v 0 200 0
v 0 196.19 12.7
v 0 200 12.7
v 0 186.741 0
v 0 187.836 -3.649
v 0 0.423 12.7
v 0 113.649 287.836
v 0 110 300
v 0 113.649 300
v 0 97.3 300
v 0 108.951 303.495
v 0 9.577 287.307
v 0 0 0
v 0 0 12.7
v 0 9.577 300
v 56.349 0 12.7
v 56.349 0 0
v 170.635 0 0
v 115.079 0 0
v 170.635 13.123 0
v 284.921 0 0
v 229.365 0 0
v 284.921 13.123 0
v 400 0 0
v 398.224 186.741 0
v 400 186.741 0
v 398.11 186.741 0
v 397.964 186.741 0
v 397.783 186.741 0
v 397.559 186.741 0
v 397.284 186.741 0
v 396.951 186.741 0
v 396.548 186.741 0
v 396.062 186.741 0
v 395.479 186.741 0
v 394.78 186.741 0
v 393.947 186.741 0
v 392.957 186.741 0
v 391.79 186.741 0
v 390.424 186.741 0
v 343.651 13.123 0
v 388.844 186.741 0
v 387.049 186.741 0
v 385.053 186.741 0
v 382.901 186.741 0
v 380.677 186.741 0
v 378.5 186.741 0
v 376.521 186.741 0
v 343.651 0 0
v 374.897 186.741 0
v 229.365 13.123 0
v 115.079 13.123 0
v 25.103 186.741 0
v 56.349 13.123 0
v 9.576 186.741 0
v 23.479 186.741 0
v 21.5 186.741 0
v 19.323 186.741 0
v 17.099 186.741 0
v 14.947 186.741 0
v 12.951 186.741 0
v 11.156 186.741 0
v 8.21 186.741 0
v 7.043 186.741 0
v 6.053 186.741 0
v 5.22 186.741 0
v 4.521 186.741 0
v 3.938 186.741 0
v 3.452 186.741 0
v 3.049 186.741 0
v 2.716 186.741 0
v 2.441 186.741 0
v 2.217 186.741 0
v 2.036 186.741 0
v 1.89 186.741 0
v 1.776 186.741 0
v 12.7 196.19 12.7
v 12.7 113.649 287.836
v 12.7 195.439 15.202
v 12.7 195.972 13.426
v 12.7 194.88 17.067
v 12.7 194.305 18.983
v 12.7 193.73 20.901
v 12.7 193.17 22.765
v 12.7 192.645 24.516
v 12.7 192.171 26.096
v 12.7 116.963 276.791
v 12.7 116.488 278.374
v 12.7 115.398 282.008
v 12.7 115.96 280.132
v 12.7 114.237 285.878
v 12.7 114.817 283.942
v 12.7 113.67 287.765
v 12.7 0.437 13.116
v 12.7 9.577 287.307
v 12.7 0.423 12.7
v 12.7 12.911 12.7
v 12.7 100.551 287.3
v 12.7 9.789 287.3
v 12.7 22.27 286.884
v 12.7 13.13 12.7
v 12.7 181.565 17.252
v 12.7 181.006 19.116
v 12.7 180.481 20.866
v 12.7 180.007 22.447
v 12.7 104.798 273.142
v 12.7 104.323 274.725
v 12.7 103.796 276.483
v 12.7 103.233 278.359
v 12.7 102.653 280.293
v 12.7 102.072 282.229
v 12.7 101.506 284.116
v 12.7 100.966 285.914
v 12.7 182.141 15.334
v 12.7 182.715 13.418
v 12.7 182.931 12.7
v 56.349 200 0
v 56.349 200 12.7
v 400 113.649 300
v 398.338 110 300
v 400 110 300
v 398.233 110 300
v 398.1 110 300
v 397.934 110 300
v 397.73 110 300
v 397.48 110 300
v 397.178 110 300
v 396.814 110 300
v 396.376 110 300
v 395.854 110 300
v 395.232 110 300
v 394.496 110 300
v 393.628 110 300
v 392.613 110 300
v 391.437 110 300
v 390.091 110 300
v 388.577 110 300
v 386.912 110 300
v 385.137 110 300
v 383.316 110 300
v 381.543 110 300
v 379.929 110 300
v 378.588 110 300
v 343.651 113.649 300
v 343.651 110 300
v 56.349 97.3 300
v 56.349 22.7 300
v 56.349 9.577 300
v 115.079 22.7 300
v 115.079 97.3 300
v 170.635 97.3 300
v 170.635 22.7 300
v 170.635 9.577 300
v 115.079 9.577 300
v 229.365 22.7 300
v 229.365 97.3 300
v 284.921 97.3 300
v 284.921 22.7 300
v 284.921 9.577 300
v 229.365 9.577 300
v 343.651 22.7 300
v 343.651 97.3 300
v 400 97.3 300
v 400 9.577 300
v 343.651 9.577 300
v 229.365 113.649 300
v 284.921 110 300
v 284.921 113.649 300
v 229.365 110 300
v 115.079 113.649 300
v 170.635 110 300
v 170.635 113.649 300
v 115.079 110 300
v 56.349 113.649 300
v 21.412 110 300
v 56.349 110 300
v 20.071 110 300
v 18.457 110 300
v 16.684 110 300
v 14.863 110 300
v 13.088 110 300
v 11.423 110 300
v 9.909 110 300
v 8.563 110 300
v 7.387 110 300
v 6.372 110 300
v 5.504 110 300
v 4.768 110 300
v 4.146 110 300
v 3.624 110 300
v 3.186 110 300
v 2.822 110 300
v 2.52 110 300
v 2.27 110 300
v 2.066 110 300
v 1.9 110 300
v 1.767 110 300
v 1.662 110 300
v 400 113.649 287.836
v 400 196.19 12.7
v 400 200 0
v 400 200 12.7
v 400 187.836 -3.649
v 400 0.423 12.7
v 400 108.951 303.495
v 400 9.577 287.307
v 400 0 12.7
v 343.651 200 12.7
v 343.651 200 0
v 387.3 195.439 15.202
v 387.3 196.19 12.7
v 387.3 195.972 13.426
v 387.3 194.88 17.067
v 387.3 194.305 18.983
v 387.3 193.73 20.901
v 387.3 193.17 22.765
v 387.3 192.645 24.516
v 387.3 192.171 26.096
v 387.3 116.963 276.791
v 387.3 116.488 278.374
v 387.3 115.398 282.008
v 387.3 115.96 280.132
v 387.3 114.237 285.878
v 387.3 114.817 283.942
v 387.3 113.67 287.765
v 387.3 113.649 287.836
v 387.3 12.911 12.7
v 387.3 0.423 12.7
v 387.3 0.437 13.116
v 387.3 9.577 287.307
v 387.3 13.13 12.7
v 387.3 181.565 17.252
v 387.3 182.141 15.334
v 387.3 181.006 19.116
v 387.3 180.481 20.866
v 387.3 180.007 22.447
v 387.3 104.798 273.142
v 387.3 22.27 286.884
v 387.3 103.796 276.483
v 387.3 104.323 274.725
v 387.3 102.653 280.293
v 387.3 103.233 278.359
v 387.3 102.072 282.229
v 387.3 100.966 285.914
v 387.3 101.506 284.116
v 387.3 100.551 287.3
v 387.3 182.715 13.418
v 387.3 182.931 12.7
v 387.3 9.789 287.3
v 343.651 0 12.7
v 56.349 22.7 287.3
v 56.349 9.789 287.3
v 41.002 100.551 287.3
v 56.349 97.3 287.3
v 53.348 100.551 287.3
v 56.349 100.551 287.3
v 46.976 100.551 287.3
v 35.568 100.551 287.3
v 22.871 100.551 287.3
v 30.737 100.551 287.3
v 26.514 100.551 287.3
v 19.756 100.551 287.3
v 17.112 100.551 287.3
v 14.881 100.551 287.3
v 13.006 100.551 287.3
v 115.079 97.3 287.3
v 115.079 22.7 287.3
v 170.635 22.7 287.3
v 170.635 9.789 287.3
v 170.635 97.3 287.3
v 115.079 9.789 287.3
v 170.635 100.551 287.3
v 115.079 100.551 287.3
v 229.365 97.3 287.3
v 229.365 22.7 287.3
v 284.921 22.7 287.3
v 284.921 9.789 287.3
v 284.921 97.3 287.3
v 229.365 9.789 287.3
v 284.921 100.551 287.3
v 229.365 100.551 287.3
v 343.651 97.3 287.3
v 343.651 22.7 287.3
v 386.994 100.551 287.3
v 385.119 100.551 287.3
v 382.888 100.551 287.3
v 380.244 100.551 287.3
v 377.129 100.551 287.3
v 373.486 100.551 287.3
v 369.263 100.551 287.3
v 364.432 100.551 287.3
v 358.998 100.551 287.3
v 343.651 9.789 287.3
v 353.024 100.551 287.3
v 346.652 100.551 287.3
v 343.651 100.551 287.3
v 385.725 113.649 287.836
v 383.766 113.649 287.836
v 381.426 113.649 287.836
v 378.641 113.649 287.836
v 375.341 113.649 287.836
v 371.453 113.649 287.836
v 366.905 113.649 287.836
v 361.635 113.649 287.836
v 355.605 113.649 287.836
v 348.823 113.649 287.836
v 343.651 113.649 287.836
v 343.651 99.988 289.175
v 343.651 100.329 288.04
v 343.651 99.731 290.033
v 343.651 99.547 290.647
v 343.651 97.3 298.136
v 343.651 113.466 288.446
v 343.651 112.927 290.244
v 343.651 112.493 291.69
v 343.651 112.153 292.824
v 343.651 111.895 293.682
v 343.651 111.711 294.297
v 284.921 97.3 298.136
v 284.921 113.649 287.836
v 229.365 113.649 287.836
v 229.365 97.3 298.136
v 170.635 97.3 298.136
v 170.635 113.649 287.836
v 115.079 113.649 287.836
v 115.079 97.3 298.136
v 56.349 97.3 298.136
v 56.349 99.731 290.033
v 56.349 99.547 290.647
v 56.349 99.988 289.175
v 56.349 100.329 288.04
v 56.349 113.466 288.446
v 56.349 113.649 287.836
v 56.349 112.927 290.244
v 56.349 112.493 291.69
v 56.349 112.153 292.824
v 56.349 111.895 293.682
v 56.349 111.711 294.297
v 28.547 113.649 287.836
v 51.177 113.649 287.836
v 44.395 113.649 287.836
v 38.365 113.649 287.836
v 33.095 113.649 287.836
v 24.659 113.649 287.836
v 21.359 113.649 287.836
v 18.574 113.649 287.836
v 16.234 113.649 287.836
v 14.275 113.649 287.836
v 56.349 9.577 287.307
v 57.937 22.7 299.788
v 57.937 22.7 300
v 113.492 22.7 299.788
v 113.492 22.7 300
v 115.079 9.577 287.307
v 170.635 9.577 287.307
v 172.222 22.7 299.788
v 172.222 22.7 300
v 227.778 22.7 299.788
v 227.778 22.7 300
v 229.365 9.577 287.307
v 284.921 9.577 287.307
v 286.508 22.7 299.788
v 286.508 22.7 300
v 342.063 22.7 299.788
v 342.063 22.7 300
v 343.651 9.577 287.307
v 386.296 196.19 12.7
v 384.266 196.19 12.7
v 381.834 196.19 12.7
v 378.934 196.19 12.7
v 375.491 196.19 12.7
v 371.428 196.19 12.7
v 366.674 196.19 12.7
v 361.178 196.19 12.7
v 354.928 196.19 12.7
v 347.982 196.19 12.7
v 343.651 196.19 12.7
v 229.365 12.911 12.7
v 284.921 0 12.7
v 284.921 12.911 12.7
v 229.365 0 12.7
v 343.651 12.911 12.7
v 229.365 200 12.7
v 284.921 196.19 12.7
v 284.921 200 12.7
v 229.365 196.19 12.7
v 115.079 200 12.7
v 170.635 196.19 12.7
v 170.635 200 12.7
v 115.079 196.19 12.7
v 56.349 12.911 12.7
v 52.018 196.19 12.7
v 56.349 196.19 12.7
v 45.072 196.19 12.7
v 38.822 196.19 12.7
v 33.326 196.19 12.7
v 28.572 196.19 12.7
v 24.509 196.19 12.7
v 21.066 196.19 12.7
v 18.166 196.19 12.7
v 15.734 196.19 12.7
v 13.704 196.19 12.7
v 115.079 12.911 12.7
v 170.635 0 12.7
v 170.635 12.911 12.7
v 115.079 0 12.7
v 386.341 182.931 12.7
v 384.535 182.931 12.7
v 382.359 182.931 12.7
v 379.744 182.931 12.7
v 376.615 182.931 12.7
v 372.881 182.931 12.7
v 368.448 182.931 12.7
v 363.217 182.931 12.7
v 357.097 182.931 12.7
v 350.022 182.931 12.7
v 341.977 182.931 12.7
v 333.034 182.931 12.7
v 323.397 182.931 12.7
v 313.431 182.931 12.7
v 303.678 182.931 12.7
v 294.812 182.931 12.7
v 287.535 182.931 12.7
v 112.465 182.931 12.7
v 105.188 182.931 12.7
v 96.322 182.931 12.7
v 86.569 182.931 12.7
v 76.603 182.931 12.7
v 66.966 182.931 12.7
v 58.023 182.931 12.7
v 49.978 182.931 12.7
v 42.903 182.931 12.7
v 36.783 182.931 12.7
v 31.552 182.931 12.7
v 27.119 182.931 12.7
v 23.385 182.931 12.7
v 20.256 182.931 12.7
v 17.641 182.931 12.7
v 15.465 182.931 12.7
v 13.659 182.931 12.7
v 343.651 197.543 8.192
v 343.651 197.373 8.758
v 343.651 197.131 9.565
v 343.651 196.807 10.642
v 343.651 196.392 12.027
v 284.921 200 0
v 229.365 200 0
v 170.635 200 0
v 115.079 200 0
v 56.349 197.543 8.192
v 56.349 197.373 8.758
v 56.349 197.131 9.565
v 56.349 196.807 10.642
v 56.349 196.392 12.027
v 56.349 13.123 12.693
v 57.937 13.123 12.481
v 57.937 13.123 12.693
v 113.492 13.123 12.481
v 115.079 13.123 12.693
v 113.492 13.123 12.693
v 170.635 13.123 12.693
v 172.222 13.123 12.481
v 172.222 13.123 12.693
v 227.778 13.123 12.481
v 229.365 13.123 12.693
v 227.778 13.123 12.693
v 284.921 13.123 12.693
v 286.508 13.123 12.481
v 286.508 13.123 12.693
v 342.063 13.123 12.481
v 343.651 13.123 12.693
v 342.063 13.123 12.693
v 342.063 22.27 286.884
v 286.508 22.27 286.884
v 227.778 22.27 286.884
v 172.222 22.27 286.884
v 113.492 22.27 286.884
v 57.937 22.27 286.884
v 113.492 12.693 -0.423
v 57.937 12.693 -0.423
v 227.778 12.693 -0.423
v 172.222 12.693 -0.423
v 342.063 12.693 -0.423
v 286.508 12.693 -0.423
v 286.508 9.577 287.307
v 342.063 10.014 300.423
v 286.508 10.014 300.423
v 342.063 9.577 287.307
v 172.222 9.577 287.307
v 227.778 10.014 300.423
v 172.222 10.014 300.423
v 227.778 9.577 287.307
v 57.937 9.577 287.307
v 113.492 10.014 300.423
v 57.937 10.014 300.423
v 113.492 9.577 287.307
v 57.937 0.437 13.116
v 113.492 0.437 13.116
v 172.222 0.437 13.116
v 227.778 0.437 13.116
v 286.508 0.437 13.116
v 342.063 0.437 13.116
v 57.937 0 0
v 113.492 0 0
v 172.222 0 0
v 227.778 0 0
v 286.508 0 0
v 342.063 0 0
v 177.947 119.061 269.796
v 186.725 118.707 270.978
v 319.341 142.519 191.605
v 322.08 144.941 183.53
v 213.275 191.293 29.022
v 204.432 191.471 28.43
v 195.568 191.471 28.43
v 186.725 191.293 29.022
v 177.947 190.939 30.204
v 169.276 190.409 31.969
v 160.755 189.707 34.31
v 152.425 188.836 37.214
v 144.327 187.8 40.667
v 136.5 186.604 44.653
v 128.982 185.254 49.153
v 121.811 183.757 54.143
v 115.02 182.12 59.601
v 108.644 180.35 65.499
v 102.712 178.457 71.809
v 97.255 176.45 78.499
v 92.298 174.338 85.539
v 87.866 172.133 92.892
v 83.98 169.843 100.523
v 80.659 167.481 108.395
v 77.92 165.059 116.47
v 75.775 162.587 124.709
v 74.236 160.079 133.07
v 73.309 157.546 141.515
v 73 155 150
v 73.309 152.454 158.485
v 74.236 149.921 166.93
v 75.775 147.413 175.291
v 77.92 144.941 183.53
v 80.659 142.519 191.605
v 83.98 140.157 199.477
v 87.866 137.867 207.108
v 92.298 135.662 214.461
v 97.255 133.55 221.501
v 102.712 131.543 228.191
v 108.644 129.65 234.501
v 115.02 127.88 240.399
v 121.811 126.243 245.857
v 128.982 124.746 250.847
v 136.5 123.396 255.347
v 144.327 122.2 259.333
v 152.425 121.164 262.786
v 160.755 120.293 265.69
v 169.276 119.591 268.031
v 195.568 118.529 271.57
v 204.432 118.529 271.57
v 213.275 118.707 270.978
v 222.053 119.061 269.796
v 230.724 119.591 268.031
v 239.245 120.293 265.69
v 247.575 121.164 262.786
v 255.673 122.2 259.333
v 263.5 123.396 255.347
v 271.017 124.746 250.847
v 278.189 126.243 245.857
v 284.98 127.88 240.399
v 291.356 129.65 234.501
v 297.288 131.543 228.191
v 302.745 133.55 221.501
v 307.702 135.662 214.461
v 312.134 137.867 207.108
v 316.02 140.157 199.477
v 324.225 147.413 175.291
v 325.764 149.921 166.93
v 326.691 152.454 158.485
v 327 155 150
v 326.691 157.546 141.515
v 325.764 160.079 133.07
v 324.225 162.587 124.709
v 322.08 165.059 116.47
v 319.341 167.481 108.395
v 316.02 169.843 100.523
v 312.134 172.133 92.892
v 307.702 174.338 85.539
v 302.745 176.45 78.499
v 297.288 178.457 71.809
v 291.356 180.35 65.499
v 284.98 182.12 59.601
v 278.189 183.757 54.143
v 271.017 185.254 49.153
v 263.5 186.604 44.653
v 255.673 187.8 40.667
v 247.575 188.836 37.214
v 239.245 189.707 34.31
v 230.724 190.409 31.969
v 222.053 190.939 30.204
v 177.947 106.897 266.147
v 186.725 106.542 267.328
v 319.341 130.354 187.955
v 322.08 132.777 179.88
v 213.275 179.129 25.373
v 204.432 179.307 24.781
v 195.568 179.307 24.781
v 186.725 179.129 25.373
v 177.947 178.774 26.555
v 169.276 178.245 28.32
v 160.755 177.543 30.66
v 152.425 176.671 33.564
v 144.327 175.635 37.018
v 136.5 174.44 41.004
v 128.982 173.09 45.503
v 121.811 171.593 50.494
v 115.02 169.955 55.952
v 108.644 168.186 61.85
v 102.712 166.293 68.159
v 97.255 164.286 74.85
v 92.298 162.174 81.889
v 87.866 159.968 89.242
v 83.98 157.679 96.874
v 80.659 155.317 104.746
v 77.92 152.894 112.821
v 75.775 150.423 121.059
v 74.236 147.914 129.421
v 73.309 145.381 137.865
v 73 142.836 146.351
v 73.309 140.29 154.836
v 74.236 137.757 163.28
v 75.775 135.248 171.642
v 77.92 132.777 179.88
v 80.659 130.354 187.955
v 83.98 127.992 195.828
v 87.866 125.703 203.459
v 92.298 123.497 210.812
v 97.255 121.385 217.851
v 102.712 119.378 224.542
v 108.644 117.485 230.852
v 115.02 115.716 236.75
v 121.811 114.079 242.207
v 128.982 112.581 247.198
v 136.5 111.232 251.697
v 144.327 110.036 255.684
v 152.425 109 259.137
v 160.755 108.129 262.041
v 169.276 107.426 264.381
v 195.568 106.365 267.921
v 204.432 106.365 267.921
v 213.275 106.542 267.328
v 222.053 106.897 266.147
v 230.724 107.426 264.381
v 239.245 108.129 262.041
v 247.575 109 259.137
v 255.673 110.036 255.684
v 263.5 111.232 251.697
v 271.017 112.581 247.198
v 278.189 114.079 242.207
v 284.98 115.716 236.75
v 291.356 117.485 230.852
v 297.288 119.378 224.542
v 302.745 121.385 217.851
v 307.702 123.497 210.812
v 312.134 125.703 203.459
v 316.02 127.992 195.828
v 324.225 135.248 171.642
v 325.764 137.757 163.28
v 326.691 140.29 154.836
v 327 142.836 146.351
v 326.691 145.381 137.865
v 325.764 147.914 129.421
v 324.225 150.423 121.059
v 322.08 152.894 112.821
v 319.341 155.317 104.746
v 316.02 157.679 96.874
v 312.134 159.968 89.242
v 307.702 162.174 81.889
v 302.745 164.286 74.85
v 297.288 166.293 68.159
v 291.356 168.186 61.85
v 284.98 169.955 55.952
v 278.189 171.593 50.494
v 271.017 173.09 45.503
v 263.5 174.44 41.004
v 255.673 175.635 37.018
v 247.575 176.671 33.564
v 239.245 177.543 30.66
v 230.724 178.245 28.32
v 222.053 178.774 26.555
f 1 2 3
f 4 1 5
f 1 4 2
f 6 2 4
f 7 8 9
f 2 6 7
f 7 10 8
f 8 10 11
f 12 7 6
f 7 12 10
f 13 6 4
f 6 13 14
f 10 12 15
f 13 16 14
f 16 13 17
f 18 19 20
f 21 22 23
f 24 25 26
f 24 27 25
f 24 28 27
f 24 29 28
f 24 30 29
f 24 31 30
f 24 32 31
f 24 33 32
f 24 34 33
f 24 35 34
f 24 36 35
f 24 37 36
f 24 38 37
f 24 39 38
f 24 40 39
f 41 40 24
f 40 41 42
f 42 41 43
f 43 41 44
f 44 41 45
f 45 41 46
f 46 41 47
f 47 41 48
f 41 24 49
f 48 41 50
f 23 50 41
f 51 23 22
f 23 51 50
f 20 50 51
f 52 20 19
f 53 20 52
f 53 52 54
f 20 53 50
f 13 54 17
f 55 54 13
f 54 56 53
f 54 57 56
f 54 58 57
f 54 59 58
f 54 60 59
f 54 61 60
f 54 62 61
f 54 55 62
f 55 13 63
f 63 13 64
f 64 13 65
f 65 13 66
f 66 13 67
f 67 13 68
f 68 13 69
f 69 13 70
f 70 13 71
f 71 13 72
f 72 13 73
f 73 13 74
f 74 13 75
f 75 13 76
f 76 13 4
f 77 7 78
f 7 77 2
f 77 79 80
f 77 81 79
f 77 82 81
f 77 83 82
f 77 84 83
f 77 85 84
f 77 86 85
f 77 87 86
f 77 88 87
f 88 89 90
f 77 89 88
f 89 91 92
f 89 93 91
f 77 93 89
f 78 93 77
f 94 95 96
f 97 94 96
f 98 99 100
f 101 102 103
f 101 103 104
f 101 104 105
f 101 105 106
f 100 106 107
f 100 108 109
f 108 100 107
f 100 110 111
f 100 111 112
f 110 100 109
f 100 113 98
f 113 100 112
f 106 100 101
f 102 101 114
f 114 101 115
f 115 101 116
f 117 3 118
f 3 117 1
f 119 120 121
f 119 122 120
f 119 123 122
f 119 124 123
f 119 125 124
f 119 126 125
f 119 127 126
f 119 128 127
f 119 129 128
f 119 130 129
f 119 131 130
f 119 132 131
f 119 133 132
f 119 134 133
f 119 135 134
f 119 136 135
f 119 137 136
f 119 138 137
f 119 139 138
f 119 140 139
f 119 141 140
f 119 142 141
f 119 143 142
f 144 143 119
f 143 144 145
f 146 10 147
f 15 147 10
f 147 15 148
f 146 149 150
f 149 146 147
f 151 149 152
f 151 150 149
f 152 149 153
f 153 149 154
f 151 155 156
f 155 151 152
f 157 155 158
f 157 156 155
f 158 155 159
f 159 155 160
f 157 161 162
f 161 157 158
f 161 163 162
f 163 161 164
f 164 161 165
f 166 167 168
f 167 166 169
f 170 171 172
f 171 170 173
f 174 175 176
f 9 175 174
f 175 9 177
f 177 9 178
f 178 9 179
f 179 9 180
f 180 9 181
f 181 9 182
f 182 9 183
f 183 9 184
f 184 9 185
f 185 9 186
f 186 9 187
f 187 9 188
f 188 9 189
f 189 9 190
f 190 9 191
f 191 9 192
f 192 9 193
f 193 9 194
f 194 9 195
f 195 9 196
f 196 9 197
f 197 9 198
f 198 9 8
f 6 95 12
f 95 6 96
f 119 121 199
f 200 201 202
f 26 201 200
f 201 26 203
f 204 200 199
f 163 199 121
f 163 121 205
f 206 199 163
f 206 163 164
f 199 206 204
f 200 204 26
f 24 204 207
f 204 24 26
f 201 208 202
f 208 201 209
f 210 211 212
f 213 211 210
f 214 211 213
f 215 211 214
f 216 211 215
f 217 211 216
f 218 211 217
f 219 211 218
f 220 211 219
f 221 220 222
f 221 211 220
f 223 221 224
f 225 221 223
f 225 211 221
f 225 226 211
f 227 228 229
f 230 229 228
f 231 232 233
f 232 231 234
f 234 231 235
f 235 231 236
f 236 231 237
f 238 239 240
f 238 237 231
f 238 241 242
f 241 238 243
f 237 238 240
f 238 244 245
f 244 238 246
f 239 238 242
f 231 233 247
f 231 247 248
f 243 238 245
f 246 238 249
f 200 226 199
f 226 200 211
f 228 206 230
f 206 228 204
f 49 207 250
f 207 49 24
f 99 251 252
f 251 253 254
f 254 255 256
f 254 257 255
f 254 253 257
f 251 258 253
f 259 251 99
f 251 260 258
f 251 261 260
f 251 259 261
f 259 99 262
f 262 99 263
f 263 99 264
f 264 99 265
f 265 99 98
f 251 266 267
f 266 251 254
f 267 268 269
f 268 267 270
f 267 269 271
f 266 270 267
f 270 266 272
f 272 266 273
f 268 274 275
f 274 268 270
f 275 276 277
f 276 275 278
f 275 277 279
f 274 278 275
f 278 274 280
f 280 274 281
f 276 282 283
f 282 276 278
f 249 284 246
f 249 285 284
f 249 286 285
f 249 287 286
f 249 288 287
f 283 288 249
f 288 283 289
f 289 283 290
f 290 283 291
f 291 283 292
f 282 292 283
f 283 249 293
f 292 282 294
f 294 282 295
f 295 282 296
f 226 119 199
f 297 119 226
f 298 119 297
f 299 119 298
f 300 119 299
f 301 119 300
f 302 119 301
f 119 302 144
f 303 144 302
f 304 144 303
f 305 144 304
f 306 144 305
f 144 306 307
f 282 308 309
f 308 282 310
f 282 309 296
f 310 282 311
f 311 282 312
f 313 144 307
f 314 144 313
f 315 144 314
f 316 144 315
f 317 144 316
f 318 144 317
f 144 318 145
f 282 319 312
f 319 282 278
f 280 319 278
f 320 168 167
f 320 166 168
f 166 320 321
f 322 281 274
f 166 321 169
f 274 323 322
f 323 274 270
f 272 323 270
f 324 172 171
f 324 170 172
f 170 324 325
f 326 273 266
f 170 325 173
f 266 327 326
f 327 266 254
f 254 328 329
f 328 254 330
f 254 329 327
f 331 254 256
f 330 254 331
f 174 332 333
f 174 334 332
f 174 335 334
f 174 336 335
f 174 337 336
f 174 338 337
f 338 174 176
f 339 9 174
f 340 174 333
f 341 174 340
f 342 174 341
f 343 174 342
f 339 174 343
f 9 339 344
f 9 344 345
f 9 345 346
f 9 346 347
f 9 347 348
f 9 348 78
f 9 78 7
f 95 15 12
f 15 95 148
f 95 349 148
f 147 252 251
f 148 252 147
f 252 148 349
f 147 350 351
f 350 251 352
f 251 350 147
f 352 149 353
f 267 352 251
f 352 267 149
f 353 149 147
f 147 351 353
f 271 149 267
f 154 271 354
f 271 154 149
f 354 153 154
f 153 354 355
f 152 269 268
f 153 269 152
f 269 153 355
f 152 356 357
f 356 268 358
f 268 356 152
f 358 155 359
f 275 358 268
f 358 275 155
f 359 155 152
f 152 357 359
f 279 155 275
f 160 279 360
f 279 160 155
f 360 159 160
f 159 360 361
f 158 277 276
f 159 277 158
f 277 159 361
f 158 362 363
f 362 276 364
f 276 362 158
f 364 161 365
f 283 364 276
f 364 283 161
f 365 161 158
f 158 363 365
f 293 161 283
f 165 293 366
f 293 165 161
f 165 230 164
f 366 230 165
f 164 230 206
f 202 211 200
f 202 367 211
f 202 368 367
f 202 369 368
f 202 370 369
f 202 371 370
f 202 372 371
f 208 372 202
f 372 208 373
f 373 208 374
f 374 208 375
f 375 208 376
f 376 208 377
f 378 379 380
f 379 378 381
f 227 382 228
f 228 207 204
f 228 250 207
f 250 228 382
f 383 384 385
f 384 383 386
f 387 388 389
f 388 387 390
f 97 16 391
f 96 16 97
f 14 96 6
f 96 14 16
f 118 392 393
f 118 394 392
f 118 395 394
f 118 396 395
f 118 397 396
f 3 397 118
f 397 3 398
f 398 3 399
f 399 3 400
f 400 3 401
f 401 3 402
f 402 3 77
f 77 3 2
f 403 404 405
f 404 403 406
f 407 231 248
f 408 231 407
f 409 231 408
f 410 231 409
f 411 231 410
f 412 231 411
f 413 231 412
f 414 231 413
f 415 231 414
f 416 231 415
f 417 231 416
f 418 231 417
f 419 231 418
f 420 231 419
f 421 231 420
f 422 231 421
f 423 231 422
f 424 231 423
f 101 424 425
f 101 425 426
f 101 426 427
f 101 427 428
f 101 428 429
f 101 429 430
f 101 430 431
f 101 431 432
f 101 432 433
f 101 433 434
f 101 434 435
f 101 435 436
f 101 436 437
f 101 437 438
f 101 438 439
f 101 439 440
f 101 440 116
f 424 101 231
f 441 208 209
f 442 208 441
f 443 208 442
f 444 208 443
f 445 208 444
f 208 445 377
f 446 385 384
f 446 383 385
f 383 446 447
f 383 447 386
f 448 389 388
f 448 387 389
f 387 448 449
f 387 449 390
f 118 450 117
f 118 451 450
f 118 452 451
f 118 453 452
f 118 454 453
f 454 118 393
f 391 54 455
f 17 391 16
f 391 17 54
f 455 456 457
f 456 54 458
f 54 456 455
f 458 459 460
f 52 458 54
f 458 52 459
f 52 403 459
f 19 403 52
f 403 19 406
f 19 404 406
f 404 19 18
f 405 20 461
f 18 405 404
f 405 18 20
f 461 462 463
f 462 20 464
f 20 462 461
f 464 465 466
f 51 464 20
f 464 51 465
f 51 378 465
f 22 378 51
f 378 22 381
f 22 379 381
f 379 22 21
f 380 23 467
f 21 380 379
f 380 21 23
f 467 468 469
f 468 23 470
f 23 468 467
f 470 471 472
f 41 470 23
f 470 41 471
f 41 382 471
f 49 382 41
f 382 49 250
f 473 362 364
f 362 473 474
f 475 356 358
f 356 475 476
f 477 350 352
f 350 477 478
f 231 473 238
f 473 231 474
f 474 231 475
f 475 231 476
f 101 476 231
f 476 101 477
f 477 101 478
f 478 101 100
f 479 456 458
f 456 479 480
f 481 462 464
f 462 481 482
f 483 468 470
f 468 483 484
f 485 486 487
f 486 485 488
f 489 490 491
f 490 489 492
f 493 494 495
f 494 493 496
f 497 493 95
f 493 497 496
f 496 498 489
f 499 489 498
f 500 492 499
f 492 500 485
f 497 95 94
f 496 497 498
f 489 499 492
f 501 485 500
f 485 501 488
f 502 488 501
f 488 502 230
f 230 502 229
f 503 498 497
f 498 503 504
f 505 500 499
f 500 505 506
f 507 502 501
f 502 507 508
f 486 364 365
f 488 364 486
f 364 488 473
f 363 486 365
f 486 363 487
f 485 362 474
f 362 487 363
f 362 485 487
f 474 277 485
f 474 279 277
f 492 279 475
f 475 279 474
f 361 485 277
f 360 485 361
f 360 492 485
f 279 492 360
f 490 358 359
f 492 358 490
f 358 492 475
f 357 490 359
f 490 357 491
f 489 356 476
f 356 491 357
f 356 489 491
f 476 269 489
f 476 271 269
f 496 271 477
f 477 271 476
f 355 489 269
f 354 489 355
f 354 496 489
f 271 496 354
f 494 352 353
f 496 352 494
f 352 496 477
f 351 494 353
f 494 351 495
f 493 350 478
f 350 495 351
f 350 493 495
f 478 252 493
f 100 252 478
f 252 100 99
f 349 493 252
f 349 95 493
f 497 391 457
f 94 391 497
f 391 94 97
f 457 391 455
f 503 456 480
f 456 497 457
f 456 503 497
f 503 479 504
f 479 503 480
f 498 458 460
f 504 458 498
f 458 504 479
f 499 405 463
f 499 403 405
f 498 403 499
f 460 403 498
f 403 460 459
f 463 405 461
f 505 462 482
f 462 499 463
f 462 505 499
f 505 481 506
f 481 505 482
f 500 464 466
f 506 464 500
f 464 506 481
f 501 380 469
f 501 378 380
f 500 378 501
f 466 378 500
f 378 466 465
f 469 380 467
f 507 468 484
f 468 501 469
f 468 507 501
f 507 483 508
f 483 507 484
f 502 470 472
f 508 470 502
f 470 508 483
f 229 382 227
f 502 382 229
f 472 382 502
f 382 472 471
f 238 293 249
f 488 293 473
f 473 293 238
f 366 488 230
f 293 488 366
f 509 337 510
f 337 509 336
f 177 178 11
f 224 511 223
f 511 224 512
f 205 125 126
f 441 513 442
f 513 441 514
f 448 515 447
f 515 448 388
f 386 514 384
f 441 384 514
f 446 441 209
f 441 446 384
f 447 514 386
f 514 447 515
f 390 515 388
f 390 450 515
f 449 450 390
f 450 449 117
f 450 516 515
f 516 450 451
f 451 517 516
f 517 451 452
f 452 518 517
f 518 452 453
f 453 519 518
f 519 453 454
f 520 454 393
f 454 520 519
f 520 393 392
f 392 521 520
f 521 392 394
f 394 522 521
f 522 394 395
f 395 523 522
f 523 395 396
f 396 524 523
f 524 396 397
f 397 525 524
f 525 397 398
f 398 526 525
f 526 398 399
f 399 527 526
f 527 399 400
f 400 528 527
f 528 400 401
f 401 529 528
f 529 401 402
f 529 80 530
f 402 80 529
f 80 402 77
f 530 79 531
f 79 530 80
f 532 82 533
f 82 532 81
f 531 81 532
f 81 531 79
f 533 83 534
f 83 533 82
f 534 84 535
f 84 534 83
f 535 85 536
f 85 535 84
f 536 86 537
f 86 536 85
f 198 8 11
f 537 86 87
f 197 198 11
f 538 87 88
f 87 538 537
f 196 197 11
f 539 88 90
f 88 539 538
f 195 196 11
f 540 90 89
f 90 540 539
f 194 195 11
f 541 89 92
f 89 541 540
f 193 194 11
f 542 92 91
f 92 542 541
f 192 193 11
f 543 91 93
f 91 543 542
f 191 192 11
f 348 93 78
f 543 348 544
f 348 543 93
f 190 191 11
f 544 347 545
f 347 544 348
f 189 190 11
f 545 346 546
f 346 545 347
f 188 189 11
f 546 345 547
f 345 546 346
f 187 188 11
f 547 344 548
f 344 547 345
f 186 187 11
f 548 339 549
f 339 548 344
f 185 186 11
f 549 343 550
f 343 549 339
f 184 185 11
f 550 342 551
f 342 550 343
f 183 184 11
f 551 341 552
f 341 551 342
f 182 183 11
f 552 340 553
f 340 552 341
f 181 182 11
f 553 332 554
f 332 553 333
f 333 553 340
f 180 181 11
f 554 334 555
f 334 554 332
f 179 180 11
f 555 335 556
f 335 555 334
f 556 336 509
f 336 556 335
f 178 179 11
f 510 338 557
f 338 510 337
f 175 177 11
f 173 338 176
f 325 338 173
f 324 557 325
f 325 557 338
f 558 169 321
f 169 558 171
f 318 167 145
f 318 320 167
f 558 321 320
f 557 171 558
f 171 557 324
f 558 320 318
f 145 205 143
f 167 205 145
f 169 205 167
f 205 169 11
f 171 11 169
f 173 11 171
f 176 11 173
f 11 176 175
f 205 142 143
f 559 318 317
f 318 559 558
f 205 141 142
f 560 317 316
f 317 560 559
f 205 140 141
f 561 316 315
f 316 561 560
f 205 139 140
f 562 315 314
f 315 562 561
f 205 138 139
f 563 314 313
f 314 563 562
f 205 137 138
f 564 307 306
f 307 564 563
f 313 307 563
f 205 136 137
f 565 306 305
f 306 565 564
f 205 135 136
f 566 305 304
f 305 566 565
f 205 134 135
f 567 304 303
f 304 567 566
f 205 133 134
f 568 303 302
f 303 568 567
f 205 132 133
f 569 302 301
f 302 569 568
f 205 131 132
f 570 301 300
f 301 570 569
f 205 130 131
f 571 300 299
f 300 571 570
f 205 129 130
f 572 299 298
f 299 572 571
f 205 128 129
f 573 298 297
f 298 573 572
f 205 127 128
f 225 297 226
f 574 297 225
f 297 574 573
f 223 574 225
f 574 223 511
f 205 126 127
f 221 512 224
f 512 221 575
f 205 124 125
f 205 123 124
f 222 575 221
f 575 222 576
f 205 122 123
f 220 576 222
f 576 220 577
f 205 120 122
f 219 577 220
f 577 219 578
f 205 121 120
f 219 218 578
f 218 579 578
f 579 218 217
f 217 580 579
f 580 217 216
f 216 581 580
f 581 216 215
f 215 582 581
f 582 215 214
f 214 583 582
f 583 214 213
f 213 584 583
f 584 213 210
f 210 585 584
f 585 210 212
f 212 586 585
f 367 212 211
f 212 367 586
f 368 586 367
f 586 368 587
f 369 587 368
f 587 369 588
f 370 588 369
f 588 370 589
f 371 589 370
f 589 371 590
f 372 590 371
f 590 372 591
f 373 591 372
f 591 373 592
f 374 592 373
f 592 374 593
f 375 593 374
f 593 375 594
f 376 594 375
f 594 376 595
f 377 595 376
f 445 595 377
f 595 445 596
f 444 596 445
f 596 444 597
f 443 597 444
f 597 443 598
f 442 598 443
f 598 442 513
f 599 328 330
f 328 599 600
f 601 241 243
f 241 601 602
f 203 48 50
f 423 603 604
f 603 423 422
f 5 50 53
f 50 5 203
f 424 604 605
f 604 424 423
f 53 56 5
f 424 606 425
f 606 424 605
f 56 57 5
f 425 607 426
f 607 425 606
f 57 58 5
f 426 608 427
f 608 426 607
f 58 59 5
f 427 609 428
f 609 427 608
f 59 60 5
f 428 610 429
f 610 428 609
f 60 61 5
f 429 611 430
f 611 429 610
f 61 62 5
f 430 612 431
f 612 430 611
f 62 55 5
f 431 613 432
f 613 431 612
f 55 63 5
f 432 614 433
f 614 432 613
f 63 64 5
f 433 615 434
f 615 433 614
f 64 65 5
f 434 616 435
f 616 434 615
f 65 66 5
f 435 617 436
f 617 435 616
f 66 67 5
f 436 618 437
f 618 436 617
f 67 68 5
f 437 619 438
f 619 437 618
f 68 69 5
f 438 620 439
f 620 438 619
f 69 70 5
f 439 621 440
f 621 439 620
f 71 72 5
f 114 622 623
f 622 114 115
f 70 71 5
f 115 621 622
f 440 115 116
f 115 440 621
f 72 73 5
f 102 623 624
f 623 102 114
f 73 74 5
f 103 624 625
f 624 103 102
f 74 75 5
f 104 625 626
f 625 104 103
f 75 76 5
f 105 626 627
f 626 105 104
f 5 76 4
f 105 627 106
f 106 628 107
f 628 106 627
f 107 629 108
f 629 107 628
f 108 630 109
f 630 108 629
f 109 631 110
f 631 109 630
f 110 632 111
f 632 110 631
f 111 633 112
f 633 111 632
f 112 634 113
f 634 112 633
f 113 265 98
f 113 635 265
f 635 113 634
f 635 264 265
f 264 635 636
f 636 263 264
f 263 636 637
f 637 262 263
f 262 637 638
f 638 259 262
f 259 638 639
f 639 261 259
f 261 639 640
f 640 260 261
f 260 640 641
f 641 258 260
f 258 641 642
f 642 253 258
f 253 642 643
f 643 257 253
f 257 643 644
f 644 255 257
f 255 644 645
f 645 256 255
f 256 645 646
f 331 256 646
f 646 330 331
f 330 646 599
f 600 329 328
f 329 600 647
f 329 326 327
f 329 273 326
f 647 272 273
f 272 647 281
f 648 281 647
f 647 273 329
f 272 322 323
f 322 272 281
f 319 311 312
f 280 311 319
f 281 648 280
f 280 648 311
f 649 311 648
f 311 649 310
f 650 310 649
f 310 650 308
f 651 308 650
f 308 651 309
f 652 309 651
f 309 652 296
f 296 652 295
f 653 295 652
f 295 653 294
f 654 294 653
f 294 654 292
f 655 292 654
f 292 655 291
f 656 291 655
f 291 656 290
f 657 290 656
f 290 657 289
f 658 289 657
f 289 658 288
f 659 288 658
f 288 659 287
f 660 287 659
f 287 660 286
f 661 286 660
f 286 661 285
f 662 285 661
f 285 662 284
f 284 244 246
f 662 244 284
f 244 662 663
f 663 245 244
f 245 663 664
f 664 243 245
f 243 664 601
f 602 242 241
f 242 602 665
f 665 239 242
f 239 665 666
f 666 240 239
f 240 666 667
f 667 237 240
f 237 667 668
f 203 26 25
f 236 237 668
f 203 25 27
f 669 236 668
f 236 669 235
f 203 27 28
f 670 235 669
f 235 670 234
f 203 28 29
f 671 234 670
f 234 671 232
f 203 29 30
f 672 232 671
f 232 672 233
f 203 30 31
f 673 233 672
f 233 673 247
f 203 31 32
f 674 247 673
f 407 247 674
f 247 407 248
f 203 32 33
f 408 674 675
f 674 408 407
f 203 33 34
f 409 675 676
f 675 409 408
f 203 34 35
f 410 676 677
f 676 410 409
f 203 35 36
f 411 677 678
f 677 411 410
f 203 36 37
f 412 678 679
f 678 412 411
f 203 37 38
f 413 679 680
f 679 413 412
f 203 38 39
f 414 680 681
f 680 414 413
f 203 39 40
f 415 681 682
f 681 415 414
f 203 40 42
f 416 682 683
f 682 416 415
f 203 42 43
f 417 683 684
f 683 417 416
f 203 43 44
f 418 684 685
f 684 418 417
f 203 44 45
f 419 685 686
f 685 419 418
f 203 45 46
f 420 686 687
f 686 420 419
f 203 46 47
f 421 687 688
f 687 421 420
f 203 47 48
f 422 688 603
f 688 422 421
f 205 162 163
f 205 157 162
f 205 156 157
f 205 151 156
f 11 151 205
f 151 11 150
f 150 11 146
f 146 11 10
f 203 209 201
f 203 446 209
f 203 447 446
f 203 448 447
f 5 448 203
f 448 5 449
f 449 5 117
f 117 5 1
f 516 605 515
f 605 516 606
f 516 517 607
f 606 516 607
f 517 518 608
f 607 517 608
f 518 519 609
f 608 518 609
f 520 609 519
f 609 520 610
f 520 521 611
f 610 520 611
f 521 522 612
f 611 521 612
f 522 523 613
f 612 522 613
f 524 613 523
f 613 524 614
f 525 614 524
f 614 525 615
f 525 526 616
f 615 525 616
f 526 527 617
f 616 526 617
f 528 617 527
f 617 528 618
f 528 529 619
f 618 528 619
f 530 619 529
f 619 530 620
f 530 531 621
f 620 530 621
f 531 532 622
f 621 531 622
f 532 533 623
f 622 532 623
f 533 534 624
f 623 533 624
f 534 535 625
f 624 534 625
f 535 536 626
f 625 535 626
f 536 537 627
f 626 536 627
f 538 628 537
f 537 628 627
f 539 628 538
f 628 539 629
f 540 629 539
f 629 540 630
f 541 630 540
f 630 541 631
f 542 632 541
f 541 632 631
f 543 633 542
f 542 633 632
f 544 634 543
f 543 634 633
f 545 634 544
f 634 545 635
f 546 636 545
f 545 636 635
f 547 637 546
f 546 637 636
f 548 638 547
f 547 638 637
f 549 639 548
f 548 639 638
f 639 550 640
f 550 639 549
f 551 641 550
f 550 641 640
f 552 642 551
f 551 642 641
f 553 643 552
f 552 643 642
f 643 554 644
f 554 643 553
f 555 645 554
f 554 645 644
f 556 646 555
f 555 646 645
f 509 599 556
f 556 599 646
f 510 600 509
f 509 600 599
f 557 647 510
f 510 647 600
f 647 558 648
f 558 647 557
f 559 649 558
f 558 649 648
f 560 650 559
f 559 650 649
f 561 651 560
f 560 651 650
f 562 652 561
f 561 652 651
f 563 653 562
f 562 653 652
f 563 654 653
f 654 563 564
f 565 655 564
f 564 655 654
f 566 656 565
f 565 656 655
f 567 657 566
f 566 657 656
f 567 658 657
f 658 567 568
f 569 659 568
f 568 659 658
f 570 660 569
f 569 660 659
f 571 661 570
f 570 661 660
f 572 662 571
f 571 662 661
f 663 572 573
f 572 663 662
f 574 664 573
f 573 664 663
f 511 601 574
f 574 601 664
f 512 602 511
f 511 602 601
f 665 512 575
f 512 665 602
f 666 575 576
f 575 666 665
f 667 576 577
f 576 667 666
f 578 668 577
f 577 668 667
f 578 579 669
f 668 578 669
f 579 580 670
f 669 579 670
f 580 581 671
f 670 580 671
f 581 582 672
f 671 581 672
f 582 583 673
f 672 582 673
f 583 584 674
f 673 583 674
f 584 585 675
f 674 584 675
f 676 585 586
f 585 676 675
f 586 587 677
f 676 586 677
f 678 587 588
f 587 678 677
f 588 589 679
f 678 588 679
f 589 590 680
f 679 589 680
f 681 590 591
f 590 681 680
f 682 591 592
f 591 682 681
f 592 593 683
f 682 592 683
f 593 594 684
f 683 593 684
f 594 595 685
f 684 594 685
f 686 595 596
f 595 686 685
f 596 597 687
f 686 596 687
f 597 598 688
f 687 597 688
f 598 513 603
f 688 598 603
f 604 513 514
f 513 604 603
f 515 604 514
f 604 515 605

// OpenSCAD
// file: joints.scad
module pintail_gaps(edge,depth,pins,gap=0) {
    segments=pins*2+1;
    segment=edge/segments;

    for(y=[segment:segment:edge-1])
    translate([0,y-gap/2])
    square([depth,gap]);
}

module negative_pins(edge,depth,pins,gap=0,hole=0) {
    segments=pins*2+1;
    segment=edge/segments;

    for(y=[0:segment*2:edge])
    translate([0,y])
    square([depth,segment]);

    pintail_gaps(edge,depth,pins,gap);

    if(hole)
    pin_holes(edge,depth,pins,hole);

}

module pintail_test(edge=200,depth=12,pins=4,gap=3,hole=6) {
    color("lime")
    negative_pins(edge,depth,pins,gap,hole);
    color("blue")
    negative_tails(edge,depth,pins,gap,hole);
}

module tail_holes(edge,depth,pins,hole) {
    segments=pins*2+1;
    segment=edge/segments;

    for(y=[segment/2:segment*2:edge])
    translate([depth/2,y])
    circle(d=hole);
}


module pin_holes(edge,depth,pins,hole) {
    segments=pins*2+1;
    segment=edge/segments;

    for(y=[segment*1.5:segment*2:edge])
    translate([depth/2,y])
    circle(d=hole);
}

module negative_tails(edge,depth,pins,gap=0,hole=0) {
    segments=pins*2+1;
    segment=edge/segments;

    for(y=[segment:segment*2:edge-1])
    translate([0,y])
    square([depth,segment]);
    pintail_gaps(edge,depth,pins,gap);

    if(hole)
    tail_holes(edge,depth,pins,hole);
}

pintail_test();
// main file
use <joints.scad>;
pad=0.1;
zero=0.001;
in=25.4;
$fn=90;
wood=in/2;


width=400;
height=300;
bottom=200;
top=100;
back_offset=10;

front_angle=atan((bottom-top-back_offset)/height);
back_angle=atan((back_offset)/height);

front=height/cos(front_angle);
back=height/cos(back_angle);

back_extra=sin(back_angle)*wood;
front_extra=sin(front_angle)*wood;

speaker=10*in;

bit=in/4;
x_pins=3;
pintail_gap=in/16;
pintail_holes=0;
pintail_ear=bit;

module dirror_y(y=0) {
	children();
	translate([0,y])
	mirror([0,1])
	children();
}

module dirror_x(x=0) {
	children();
	translate([x,0])
	mirror([1,0])
	children();
}

module wood(h=wood) {
	linear_extrude(height=h)
	children();
}

module top() {
	difference() {
		translate([0,-back_extra])
		square([width,top+front_extra+back_extra]);

		translate([width,-pad-back_extra])
		rotate([0,0,90])
		negative_tails(width,wood+back_extra+pad,x_pins,pintail_gap,pintail_holes,pintail_ear);
		translate([width,top+front_extra+pad])
		mirror([0,1,0])
		rotate([0,0,90])
		#negative_tails(width,wood+front_extra+pad,x_pins,pintail_gap,pintail_holes,pintail_ear);
	}
}

module bottom() {
	difference() {
		square([width,bottom]);
		dirror_y(bottom)
		translate([width,-pad])
		rotate([0,0,90])
		negative_tails(width,wood+back_extra+pad,x_pins,pintail_gap,pintail_holes,pintail_ear);
	}
}

module side() {
	hull() {
		translate([back_offset,height-zero])
		square([top,zero]);
		square([bottom,zero]);
	}
}

module front() {
	difference() {
		square([width,front+front_extra]);
		translate([width/2,front/2])
		circle(d=speaker);
	}
}

module back() {
	difference() {
		square([width,back+back_extra]);
		dirror_y(back+back_extra)
		translate([width,-pad])
		rotate([0,0,90])
		negative_pins(width,wood+back_extra+pad,x_pins,pintail_gap,pintail_holes,pintail_ear);
	}
}

module assembled() {
	color("brown")
	translate([0,back_offset,height-wood])
	wood()
	top();

	color("brown")
	wood()
	bottom();

	color("chocolate")
	dirror_x(width)
	rotate([90,0,90])
	wood()
	side();

	color("peru")
	rotate([90-back_angle,0])
	translate([0,0,-wood])
	wood()
	back();

	color("peru")
	translate([0,bottom,0])
	rotate([90+front_angle,0])
	wood()
	front();
}

assembled();
